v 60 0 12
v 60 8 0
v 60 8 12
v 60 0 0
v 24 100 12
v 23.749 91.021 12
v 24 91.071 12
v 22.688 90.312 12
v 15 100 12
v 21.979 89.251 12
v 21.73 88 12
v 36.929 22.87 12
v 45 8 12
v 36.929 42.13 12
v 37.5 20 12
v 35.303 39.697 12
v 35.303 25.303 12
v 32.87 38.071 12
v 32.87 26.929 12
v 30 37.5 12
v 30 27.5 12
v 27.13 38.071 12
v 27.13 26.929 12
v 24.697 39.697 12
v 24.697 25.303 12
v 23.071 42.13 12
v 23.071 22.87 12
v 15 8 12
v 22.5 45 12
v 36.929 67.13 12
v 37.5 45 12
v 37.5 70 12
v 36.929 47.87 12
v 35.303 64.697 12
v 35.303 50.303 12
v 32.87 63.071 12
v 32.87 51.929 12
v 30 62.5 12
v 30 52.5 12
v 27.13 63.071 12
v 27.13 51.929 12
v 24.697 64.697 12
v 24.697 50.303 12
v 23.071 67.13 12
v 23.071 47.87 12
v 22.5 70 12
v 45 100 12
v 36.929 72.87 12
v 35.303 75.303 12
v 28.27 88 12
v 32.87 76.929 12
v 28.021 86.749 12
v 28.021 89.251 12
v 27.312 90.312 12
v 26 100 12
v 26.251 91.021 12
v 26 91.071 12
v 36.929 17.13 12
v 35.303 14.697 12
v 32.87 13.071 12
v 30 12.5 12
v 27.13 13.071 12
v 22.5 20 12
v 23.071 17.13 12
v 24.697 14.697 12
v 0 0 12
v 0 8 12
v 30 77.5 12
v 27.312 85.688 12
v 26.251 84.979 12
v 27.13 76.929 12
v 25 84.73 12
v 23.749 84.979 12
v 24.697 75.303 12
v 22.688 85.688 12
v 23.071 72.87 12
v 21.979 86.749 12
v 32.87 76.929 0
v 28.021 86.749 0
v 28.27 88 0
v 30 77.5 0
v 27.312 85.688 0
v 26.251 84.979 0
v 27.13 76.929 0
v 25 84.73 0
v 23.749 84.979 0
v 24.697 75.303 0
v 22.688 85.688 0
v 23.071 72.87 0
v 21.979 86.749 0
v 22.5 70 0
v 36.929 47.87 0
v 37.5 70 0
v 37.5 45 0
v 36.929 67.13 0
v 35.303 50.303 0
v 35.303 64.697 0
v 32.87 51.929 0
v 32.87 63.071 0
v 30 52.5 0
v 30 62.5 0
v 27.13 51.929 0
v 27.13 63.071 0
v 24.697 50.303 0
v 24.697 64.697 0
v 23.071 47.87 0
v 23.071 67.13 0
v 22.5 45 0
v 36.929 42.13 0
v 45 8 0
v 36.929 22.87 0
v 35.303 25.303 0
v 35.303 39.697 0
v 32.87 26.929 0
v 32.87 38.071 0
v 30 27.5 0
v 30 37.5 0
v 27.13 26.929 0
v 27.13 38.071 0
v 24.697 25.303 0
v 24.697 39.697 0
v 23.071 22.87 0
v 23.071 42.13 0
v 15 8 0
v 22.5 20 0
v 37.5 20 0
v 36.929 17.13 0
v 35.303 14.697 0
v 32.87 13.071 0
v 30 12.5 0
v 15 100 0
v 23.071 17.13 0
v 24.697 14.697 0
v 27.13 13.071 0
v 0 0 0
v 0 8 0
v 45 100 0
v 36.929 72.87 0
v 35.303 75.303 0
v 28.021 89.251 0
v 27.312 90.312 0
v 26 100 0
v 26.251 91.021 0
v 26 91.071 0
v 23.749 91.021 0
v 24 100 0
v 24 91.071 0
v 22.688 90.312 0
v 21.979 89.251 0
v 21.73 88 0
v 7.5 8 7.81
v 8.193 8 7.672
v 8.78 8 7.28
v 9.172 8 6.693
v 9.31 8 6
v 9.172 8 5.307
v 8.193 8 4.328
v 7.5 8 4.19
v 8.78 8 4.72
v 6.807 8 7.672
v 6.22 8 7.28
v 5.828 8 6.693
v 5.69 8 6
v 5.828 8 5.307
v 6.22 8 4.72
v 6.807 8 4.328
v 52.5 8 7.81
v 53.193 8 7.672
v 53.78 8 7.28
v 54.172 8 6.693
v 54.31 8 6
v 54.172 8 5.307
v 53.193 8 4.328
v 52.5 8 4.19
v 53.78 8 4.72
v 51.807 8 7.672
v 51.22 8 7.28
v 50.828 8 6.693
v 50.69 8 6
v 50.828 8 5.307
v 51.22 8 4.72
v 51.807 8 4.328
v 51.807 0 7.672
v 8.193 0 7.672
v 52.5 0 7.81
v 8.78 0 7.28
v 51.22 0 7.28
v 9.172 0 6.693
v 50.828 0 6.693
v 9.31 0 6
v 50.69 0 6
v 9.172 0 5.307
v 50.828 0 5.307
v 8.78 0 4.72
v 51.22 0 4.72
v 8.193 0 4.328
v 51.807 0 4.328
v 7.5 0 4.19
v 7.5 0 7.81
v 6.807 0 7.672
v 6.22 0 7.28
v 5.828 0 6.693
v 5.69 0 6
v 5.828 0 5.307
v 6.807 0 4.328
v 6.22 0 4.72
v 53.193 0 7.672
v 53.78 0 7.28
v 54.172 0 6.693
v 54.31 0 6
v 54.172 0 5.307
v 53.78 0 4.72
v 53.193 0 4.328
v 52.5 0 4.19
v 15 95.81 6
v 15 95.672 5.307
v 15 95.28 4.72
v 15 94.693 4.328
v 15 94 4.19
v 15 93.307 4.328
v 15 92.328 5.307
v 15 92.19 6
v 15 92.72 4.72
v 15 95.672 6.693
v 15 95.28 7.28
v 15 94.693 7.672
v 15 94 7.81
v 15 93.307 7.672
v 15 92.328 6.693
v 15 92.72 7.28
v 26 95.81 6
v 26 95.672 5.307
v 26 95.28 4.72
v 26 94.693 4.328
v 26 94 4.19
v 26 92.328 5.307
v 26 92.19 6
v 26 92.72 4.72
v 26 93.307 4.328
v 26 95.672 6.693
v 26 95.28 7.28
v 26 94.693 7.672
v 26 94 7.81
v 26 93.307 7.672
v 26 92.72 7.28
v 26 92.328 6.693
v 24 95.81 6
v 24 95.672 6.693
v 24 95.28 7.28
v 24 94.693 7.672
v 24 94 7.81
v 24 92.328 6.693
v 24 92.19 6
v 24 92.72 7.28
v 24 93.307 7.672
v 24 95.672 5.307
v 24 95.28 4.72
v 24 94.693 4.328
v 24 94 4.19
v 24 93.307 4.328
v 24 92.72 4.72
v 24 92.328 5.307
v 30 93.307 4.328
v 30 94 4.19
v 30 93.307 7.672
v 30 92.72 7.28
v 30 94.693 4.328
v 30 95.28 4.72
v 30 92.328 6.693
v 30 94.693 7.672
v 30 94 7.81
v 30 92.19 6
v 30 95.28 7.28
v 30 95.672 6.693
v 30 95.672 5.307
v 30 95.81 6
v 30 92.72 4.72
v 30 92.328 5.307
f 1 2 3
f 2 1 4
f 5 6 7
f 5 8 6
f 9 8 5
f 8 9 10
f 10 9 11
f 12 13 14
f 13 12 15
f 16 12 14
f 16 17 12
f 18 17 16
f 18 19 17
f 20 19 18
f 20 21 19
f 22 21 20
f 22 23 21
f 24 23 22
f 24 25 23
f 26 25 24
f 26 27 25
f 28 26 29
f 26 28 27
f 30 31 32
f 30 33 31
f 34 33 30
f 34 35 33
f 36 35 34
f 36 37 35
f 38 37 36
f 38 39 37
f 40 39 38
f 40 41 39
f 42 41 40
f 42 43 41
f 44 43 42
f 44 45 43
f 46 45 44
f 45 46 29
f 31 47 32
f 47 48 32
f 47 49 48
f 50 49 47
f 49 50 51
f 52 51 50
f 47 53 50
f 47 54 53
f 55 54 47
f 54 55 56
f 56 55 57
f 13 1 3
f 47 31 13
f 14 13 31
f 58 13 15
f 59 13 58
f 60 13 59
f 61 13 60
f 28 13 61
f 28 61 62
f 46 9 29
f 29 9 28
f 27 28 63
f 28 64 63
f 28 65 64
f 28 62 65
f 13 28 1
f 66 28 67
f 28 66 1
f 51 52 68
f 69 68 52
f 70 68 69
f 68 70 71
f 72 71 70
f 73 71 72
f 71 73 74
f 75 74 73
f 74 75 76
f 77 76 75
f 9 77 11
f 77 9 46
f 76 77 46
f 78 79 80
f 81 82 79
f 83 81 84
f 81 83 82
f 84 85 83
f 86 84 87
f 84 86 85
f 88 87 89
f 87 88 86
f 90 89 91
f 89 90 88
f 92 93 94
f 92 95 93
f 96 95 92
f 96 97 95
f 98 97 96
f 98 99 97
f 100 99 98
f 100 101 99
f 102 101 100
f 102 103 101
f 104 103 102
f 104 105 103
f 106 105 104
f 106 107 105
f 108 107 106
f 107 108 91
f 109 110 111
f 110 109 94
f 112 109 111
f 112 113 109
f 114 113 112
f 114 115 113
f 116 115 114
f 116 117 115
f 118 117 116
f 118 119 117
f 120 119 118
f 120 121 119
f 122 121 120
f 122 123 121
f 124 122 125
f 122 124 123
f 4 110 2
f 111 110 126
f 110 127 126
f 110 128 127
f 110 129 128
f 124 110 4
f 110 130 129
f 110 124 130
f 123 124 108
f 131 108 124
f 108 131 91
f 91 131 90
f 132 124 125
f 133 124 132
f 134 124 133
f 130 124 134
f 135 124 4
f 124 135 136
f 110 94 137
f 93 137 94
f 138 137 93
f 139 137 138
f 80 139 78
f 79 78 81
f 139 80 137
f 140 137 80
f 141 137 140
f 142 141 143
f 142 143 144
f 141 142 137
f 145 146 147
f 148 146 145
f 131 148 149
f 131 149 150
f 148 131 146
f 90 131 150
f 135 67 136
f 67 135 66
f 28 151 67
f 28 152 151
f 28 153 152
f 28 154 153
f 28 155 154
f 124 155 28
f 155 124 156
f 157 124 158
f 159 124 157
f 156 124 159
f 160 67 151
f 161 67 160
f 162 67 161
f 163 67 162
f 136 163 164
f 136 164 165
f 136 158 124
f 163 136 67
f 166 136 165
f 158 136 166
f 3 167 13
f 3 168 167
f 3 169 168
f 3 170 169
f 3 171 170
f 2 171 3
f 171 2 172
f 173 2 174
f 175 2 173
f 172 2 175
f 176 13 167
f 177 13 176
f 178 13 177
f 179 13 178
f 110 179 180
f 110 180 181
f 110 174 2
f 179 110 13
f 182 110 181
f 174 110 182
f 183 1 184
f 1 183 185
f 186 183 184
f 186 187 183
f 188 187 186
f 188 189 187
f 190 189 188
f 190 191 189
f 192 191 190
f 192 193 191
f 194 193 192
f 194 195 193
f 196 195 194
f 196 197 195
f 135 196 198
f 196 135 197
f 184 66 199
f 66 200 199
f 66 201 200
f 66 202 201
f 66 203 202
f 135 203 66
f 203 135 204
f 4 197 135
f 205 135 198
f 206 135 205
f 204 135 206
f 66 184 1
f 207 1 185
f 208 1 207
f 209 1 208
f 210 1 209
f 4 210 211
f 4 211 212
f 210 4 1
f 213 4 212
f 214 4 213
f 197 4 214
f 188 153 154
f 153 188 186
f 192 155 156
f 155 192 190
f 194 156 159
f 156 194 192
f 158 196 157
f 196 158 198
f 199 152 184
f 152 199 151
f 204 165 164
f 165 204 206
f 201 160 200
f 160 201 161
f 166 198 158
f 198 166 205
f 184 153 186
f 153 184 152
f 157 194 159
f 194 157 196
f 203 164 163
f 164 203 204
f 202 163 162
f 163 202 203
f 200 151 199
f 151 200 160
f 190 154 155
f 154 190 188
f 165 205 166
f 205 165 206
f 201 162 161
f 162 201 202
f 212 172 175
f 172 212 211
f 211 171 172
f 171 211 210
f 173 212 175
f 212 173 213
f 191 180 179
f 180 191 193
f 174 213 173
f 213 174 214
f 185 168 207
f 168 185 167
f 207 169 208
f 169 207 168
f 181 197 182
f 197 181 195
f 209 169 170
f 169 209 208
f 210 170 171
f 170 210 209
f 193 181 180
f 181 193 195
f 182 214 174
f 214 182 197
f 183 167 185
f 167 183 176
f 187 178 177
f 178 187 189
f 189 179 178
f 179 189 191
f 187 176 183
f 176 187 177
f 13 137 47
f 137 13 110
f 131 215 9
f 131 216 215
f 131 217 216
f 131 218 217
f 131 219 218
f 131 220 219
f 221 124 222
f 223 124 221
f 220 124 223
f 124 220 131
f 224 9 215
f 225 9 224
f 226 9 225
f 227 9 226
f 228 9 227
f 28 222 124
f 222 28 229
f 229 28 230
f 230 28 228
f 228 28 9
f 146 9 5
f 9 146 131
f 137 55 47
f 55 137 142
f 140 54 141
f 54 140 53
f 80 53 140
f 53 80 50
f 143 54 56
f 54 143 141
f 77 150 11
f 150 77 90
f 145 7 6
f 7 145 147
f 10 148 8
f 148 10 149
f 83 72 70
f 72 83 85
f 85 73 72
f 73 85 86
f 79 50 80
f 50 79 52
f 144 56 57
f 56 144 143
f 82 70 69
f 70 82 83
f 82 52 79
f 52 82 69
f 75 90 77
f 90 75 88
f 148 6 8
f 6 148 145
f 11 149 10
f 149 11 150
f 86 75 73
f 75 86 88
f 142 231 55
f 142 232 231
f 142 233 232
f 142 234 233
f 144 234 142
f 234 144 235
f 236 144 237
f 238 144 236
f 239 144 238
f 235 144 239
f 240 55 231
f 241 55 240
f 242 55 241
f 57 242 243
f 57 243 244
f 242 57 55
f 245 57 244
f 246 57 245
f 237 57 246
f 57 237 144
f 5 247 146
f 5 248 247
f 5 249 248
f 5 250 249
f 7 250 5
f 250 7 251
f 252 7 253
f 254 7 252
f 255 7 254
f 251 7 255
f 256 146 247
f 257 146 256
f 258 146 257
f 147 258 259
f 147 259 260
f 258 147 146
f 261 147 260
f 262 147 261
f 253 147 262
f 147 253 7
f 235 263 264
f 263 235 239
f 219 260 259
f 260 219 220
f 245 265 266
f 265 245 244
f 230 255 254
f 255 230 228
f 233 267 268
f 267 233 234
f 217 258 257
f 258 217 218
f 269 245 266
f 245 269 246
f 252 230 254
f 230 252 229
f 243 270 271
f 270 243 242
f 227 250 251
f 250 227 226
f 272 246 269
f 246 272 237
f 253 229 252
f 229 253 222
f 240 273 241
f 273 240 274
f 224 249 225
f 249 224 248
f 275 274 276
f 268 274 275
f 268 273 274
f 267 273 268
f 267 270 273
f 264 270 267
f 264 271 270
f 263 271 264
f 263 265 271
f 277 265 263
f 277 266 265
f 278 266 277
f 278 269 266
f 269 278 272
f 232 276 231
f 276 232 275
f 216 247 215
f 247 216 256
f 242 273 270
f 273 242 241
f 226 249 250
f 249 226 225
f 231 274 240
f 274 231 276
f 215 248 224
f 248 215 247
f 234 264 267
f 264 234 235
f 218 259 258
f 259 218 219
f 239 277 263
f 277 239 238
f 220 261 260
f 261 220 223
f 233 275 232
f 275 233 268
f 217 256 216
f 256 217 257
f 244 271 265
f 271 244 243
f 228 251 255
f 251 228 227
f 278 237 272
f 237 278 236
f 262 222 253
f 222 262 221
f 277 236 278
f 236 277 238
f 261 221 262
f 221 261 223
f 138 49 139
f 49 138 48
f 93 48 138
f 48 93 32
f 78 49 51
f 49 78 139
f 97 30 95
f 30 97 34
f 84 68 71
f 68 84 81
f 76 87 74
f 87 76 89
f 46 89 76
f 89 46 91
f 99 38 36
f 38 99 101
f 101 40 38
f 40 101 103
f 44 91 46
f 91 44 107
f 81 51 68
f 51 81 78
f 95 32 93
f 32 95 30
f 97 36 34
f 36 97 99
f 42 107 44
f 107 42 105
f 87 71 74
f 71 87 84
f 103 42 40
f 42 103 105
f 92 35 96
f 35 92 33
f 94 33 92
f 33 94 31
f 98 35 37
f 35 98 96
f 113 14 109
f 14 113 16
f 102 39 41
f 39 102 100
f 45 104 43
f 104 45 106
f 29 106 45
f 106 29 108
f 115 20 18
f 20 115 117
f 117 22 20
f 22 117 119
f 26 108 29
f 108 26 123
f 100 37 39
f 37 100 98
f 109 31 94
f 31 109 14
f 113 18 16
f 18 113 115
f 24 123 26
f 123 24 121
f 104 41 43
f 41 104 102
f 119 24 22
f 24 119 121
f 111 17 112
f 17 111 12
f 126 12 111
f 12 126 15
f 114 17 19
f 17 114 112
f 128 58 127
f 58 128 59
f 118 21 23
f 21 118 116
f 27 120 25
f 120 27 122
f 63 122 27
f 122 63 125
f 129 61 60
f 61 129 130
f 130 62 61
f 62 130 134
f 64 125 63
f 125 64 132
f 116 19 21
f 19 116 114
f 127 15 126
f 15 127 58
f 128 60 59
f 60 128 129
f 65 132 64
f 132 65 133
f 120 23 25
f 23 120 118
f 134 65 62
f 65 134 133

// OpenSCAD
//-------------------------------------------------------
//2012-2013 Carignan's Design
//Under Open Hardware license
//And the help of all the previous Open hardware inventor
//and Designer Pionners
//-------------------------------------------------------
$fn=16;
//This parts is use to hold the herribord rack holding on the motor side

//Specs
ArmLenght     = 95; //mm
ArmWidth	  = 12; //mm
ArmHeight     = 30; //mm
ArmBaseLenght = 8;  //mm
ArmBaseHeight = ArmHeight+30; //mm
RodHoleRad    = 3.27; //mm
ScrewHoleRad  = 1.81; //mm


//Calculated pos and Spec
ArmX = (ArmBaseHeight - ArmHeight) /2;
ArmTopY = ArmLenght + ArmBaseLenght;

ScrewHoleOffset = (ArmBaseHeight - ArmHeight ) / 4 ;

//Draw the base
difference()
{
	union()
	{	
		cube([ArmBaseHeight,ArmBaseLenght,ArmWidth]);
		//translate([0,0,ArmBaseLenght]) rotate([270,0,00]) cylinder(h=ArmBaseLenght,r=ArmWidth/2); 
		//translate([ArmBaseHeight,0,ArmBaseLenght]) rotate([270,0,00]) cylinder(h=ArmBaseLenght,r=ArmWidth/2); 
	}
	translate([ScrewHoleOffset,0,ArmWidth/2]) rotate([270,0,00]) cylinder(h=ArmBaseLenght,r=ScrewHoleRad); 
	translate([ArmBaseHeight-ScrewHoleOffset,0,ArmWidth/2]) rotate([270,0,00]) cylinder(h=ArmBaseLenght,r=ScrewHoleRad); 
}

//Draw the main arm
difference()
{
	translate([ArmX,5,0]) cube([ArmHeight,ArmLenght,ArmWidth]);

	//Draw the Support Rod hole ( this hole will hold the Rod that will be inserted in the rack )
	translate([ArmX+10,ArmTopY-15,0]) cylinder(h=20, r=RodHoleRad);
	translate([ArmX+10-1,ArmTopY-15,0]) cube([2,15,20]);
	translate([30,ArmTopY-9,ArmWidth/2]) rotate([0,270,0])  cylinder(h=30,r=ScrewHoleRad);

	//Draw holes to removed a uneeded plastic
	translate([ArmBaseHeight/2,70,0]) cylinder(h=ArmWidth, r=ArmHeight/4);
	translate([ArmBaseHeight/2,45,0]) cylinder(h=ArmWidth, r=ArmHeight/4);
	translate([ArmBaseHeight/2,20,0]) cylinder(h=ArmWidth, r=ArmHeight/4);
}
